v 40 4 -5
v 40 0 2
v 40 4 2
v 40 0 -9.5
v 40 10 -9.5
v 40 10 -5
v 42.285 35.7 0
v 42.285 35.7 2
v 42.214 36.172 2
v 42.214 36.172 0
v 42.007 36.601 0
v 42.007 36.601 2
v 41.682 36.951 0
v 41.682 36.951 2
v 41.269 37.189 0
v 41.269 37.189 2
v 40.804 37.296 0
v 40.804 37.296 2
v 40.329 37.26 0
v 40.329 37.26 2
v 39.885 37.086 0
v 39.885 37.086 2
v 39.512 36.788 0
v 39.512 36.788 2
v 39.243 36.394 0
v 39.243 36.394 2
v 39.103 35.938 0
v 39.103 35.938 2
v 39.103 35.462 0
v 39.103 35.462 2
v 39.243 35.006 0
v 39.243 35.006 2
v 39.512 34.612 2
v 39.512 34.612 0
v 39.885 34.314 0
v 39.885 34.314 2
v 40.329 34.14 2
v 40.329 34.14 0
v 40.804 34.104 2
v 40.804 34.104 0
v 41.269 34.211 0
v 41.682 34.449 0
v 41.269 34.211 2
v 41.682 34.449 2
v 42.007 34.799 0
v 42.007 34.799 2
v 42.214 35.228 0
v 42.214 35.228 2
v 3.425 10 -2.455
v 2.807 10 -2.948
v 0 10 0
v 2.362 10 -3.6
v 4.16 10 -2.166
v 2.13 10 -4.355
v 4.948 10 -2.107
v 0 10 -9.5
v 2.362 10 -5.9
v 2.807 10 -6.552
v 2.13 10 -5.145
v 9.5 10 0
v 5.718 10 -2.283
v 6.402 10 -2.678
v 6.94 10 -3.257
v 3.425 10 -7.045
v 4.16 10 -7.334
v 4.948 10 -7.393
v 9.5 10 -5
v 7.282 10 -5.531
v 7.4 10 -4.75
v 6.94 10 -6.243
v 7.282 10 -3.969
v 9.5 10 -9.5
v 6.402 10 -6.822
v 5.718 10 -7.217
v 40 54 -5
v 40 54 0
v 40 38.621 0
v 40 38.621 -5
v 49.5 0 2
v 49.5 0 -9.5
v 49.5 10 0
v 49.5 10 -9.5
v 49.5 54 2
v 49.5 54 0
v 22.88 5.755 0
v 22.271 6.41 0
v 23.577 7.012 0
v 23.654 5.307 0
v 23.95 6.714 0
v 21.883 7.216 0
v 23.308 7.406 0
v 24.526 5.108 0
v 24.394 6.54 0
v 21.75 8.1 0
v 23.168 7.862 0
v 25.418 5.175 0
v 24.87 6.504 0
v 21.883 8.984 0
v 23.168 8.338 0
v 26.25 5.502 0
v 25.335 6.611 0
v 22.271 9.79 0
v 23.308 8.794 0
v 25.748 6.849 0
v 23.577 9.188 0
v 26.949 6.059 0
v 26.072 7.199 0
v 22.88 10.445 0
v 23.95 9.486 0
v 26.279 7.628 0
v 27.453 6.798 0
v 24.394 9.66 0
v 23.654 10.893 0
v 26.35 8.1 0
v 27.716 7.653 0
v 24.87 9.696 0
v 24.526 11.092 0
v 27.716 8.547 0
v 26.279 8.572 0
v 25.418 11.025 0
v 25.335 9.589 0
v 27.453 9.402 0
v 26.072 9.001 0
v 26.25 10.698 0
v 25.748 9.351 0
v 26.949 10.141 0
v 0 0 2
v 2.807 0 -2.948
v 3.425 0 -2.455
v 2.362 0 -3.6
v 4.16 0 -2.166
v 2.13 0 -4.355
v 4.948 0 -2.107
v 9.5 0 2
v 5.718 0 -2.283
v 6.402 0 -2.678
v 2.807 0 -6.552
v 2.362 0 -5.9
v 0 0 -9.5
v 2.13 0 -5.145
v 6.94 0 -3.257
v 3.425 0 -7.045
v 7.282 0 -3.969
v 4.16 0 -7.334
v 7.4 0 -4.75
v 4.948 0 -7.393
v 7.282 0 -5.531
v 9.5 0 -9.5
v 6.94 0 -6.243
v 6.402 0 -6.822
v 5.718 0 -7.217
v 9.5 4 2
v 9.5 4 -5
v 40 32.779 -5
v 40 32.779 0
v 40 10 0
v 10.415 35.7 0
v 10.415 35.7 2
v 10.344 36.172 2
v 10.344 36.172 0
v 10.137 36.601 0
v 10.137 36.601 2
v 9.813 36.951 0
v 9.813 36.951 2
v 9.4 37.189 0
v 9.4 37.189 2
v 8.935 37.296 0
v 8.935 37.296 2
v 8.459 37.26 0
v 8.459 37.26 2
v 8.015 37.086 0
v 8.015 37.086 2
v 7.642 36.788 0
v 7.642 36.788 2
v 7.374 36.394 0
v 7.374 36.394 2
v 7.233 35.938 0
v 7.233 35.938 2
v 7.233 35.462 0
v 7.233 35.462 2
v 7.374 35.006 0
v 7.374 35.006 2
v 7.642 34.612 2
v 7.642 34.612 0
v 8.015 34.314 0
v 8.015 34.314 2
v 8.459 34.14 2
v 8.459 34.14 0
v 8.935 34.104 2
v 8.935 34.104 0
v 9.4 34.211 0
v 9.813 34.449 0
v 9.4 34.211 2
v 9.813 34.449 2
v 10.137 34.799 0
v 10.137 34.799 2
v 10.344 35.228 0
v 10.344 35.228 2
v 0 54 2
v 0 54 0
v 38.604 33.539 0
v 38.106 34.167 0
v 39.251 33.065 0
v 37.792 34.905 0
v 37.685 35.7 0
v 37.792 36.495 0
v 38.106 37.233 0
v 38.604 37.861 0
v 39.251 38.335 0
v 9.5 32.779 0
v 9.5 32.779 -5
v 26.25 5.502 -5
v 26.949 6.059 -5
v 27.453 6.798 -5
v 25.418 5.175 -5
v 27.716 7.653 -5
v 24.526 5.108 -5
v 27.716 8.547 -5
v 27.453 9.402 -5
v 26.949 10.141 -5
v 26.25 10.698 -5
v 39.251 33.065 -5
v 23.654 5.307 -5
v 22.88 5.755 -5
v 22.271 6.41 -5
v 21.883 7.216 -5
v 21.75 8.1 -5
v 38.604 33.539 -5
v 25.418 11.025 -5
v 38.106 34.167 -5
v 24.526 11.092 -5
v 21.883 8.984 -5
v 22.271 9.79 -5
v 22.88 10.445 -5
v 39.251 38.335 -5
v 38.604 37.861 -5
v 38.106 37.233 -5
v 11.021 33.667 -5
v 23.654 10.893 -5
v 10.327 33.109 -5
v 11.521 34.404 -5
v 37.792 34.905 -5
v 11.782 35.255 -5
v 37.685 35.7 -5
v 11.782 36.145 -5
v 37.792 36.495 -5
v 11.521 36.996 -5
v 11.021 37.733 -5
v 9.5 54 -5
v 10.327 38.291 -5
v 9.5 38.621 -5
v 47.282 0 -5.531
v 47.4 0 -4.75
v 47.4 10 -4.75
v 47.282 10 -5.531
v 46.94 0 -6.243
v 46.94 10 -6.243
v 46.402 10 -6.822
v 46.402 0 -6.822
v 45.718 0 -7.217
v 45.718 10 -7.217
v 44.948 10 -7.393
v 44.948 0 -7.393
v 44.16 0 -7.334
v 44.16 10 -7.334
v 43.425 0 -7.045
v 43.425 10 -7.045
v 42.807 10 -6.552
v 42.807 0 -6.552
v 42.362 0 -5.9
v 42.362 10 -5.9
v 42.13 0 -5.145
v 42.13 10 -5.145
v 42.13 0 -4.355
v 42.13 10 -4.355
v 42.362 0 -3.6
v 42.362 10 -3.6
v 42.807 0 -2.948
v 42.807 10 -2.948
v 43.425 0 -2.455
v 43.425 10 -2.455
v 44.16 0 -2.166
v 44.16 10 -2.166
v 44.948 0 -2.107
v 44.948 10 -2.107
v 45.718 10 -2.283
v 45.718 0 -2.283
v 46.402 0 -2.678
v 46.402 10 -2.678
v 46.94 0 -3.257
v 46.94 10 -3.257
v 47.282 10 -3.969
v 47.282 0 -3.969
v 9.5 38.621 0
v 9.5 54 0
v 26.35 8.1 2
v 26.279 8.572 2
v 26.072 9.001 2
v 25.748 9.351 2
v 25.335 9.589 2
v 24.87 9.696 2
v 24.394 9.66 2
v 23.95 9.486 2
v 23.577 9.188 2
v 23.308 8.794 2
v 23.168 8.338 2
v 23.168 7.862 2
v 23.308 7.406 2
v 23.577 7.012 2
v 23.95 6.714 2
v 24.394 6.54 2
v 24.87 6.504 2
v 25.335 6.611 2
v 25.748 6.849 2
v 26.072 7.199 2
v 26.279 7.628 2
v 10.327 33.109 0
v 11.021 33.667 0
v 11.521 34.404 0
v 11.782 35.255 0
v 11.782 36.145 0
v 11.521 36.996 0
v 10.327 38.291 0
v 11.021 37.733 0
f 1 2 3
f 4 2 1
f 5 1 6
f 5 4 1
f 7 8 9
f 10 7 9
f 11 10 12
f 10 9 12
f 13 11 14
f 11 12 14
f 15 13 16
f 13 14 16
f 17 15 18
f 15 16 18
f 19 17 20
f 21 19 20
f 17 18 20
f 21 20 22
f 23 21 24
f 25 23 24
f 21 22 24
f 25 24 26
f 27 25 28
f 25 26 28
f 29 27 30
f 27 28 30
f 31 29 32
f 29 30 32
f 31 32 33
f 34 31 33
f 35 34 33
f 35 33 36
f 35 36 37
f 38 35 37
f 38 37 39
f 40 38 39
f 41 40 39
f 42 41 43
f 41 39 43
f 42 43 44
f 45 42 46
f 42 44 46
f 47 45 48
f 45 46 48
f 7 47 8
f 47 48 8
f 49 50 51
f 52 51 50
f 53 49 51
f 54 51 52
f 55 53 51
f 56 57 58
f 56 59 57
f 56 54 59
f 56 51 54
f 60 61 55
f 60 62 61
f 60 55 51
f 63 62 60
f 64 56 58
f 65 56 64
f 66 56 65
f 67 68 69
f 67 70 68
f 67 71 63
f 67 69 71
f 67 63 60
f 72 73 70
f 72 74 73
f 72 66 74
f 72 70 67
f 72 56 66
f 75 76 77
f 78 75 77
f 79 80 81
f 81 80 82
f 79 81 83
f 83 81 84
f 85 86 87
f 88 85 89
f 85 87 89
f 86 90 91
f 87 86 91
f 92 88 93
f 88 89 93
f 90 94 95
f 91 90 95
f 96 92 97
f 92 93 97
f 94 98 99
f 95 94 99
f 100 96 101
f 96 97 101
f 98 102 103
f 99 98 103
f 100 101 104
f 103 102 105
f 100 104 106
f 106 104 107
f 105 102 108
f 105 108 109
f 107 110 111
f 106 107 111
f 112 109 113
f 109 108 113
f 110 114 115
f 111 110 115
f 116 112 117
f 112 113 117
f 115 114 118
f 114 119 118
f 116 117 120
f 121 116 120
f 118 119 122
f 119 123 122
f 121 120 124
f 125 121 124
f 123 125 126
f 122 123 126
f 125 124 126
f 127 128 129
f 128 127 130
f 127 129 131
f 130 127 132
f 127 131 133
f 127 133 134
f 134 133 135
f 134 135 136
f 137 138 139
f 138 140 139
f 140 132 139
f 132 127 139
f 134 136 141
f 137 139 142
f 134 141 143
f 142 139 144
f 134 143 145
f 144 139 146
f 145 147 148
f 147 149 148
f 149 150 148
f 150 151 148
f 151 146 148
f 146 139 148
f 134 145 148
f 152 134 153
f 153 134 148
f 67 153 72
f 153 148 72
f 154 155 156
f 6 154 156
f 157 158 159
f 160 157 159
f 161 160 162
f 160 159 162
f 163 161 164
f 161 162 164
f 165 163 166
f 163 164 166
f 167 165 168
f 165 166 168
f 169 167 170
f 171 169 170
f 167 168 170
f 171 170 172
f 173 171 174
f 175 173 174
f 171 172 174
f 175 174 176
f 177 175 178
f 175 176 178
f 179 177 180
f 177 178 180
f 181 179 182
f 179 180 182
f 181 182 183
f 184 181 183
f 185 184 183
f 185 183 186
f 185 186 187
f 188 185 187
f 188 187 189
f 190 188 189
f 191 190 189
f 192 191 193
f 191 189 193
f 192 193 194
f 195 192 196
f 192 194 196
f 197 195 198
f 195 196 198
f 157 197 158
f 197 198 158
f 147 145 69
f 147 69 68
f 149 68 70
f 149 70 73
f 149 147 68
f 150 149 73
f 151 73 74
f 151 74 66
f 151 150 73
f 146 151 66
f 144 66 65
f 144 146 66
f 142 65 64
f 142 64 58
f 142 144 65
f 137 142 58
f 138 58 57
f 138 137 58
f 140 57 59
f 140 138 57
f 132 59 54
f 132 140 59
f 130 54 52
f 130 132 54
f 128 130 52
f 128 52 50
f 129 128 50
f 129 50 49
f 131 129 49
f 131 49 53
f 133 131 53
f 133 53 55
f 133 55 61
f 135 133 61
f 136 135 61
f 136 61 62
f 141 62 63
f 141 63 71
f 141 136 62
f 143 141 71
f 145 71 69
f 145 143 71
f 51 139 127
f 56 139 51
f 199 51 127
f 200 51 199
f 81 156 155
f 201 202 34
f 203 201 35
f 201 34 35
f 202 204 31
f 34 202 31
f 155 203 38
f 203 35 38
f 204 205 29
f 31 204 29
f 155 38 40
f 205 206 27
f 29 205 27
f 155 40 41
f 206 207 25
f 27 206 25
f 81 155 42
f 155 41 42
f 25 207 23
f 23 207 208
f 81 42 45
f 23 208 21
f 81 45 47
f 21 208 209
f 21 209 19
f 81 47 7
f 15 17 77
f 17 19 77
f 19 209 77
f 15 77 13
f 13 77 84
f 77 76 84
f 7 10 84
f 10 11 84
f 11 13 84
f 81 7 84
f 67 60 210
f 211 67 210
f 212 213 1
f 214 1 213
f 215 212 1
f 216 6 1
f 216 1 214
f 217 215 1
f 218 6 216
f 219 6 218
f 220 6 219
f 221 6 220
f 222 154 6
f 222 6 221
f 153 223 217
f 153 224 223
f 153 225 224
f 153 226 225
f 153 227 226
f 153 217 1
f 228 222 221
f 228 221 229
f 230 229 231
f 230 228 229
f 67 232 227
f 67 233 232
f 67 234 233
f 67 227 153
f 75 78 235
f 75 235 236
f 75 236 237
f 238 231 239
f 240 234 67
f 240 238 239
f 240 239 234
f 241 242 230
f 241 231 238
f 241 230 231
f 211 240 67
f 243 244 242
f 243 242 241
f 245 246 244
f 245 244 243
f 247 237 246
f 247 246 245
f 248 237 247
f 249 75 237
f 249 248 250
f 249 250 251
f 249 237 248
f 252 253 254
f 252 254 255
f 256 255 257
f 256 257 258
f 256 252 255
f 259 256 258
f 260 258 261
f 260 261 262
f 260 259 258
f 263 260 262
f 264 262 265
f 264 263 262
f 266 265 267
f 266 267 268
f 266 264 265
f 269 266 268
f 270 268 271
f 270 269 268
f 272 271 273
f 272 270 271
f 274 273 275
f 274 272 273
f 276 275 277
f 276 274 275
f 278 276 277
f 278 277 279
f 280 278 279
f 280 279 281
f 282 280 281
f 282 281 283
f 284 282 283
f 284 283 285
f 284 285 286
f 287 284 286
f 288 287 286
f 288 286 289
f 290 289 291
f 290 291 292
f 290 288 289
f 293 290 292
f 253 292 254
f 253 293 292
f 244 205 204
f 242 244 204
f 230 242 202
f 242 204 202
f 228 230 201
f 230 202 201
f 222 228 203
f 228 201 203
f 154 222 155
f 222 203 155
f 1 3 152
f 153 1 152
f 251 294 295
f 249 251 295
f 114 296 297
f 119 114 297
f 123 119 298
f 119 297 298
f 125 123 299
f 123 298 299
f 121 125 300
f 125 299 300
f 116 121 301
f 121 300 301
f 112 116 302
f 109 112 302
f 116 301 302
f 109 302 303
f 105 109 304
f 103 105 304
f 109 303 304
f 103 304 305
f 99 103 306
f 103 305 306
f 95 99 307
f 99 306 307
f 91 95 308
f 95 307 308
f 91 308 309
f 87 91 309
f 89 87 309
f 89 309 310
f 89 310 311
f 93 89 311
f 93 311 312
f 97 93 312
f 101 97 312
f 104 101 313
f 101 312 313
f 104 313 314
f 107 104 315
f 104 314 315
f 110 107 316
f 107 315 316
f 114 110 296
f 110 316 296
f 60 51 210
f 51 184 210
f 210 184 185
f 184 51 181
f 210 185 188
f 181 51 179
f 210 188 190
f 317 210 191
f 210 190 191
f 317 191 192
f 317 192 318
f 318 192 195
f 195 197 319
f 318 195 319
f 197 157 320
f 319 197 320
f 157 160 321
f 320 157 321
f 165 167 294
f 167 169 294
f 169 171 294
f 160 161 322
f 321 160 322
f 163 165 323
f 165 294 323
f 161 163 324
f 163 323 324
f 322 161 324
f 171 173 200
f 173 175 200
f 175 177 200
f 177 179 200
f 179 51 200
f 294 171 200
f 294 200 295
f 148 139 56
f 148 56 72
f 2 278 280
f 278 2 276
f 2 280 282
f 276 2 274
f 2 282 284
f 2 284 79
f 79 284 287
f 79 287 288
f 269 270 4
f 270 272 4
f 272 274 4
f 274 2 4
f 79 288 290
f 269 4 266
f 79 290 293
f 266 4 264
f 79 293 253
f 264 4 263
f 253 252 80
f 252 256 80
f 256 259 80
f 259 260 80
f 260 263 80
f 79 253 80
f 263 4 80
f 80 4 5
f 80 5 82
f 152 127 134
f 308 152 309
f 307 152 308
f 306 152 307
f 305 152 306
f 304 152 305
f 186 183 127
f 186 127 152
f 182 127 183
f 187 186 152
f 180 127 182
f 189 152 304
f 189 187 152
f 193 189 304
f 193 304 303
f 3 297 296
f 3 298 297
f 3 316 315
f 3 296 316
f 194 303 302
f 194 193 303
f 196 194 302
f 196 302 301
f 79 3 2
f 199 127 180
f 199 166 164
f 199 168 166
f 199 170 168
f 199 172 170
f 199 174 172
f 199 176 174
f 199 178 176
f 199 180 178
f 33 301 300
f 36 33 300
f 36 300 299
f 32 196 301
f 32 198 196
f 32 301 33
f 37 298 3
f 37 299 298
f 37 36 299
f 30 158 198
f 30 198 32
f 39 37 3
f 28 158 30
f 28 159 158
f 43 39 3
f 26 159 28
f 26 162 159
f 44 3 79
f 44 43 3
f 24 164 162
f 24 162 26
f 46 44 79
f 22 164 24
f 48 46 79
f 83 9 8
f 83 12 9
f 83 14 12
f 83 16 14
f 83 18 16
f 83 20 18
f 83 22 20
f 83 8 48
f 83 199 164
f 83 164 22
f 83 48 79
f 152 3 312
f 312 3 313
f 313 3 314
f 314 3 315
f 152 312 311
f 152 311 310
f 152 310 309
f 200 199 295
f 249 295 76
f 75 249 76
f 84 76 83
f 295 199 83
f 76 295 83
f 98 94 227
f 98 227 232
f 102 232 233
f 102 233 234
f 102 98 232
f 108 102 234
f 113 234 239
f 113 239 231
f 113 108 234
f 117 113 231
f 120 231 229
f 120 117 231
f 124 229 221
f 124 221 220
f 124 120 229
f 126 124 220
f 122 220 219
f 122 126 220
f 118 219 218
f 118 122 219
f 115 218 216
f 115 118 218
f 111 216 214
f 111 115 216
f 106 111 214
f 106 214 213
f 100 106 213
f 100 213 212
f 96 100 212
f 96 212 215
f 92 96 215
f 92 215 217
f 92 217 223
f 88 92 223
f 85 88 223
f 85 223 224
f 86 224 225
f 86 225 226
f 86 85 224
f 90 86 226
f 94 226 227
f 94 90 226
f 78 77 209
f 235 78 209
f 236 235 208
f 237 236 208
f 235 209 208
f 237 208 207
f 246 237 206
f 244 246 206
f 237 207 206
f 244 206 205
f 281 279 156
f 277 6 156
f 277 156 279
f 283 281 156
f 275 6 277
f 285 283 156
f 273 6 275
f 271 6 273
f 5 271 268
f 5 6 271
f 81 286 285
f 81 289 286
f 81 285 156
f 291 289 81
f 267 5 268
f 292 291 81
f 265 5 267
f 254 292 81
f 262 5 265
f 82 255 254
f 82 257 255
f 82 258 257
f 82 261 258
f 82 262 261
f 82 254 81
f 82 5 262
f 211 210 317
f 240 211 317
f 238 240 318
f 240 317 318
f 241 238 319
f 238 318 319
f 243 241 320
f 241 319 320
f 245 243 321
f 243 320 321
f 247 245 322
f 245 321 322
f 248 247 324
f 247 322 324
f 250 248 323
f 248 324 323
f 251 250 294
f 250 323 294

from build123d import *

# Parameters (mm, degrees)
SKETCH2_W             = 9.5
SKETCH2_H             = 9.5
SKETCH2_R             = 2.65
BOSS_EXTRUDE1_DEPTH   = 10
BOSS_EXTRUDE1_2_DEPTH = 10
SKETCH13_W            = 49.5
SKETCH13_H            = 50
BOSS_EXTRUDE4_DEPTH   = 2
CUT_EXTRUDE3_START    = 2
SKETCH12_R            = 1.6
CUT_EXTRUDE3_DEPTH    = 2
SKETCH14_R            = 3
BOSS_EXTRUDE5_DEPTH   = 5
SKETCH15_W            = 9.5
SKETCH15_H            = 4
BOSS_EXTRUDE6_DEPTH   = 2


with BuildPart() as part:
    # Sketch2 → Boss-Extrude1 (new body)
    with BuildSketch(Plane(origin=(0, 0, 0), x_dir=(1, 0, 0), z_dir=(0, 1, 0))):
        with Locations((4.75, 4.75)):
            Rectangle(SKETCH2_W, SKETCH2_H)
        with Locations((4.75, 4.75)):
            Circle(SKETCH2_R, mode=Mode.SUBTRACT)
    extrude(amount=BOSS_EXTRUDE1_DEPTH)



with BuildPart() as body_2:
    # Sketch2 → Boss-Extrude1 2 (new body)
    with BuildSketch(Plane(origin=(0, 0, 0), x_dir=(1, 0, 0), z_dir=(0, 1, 0))):
        with Locations((44.75, 4.75)):
            Rectangle(SKETCH2_W, SKETCH2_H)
        with Locations((44.75, 4.75)):
            Circle(SKETCH2_R, mode=Mode.SUBTRACT)
    extrude(amount=BOSS_EXTRUDE1_2_DEPTH)


with BuildPart() as part_1:
    add(part.part)

    add(body_2.part)  # Boss-Extrude4 merges body 2
    # Sketch13 → Boss-Extrude4 (add)
    with BuildSketch(Plane.XY):
        with Locations((24.75, 29)):
            Rectangle(SKETCH13_W, SKETCH13_H)
    extrude(amount=BOSS_EXTRUDE4_DEPTH)

    # Sketch12 → Cut-Extrude3 (cut)
    with BuildSketch(Plane.XY.offset(CUT_EXTRUDE3_START)):
        with Locations((24.75, 8.1)):
            Circle(SKETCH12_R)
        with Locations((8.81513257, 35.7)):
            Circle(SKETCH12_R)
        with Locations((40.68486743, 35.7)):
            Circle(SKETCH12_R)
    extrude(amount=-CUT_EXTRUDE3_DEPTH, mode=Mode.SUBTRACT)

    # Sketch14 → Boss-Extrude5 (add)
    with BuildSketch(Plane(origin=(0, 0, 0), x_dir=(-1, 0, 0), z_dir=(0, 0, -1))):
        with BuildLine():
            Line((-9.5, 54), (-40, 54))
            Line((-40, 54), (-40, 38.620780136))
            ThreePointArc((-40, 38.620780136), (-38.333846131, 37.563517871), (-37.68486743, 35.7))
            ThreePointArc((-37.68486743, 35.7), (-38.333846131, 33.836482129), (-40, 32.779219864))
            Line((-40, 32.779219864), (-40, 10))
            Line((-40, 10), (-40, 4))
            Line((-40, 4), (-9.5, 4))
            Line((-9.5, 4), (-9.5, 10))
            Line((-9.5, 10), (-9.5, 32.779219864))
            ThreePointArc((-9.5, 32.779219864), (-11.81513257, 35.7), (-9.5, 38.620780136))
            Line((-9.5, 38.620780136), (-9.5, 54))
        make_face()
        with Locations((-24.75, 8.1)):
            Circle(SKETCH14_R, mode=Mode.SUBTRACT)
    extrude(amount=BOSS_EXTRUDE5_DEPTH)

    # Sketch15 → Boss-Extrude6 (add)
    with BuildSketch(Plane.XY):
        with Locations((4.75, 2)):
            Rectangle(SKETCH15_W, SKETCH15_H)
        with Locations((44.75, 2)):
            Rectangle(SKETCH15_W, SKETCH15_H)
    extrude(amount=BOSS_EXTRUDE6_DEPTH)


solid = part_1.part
